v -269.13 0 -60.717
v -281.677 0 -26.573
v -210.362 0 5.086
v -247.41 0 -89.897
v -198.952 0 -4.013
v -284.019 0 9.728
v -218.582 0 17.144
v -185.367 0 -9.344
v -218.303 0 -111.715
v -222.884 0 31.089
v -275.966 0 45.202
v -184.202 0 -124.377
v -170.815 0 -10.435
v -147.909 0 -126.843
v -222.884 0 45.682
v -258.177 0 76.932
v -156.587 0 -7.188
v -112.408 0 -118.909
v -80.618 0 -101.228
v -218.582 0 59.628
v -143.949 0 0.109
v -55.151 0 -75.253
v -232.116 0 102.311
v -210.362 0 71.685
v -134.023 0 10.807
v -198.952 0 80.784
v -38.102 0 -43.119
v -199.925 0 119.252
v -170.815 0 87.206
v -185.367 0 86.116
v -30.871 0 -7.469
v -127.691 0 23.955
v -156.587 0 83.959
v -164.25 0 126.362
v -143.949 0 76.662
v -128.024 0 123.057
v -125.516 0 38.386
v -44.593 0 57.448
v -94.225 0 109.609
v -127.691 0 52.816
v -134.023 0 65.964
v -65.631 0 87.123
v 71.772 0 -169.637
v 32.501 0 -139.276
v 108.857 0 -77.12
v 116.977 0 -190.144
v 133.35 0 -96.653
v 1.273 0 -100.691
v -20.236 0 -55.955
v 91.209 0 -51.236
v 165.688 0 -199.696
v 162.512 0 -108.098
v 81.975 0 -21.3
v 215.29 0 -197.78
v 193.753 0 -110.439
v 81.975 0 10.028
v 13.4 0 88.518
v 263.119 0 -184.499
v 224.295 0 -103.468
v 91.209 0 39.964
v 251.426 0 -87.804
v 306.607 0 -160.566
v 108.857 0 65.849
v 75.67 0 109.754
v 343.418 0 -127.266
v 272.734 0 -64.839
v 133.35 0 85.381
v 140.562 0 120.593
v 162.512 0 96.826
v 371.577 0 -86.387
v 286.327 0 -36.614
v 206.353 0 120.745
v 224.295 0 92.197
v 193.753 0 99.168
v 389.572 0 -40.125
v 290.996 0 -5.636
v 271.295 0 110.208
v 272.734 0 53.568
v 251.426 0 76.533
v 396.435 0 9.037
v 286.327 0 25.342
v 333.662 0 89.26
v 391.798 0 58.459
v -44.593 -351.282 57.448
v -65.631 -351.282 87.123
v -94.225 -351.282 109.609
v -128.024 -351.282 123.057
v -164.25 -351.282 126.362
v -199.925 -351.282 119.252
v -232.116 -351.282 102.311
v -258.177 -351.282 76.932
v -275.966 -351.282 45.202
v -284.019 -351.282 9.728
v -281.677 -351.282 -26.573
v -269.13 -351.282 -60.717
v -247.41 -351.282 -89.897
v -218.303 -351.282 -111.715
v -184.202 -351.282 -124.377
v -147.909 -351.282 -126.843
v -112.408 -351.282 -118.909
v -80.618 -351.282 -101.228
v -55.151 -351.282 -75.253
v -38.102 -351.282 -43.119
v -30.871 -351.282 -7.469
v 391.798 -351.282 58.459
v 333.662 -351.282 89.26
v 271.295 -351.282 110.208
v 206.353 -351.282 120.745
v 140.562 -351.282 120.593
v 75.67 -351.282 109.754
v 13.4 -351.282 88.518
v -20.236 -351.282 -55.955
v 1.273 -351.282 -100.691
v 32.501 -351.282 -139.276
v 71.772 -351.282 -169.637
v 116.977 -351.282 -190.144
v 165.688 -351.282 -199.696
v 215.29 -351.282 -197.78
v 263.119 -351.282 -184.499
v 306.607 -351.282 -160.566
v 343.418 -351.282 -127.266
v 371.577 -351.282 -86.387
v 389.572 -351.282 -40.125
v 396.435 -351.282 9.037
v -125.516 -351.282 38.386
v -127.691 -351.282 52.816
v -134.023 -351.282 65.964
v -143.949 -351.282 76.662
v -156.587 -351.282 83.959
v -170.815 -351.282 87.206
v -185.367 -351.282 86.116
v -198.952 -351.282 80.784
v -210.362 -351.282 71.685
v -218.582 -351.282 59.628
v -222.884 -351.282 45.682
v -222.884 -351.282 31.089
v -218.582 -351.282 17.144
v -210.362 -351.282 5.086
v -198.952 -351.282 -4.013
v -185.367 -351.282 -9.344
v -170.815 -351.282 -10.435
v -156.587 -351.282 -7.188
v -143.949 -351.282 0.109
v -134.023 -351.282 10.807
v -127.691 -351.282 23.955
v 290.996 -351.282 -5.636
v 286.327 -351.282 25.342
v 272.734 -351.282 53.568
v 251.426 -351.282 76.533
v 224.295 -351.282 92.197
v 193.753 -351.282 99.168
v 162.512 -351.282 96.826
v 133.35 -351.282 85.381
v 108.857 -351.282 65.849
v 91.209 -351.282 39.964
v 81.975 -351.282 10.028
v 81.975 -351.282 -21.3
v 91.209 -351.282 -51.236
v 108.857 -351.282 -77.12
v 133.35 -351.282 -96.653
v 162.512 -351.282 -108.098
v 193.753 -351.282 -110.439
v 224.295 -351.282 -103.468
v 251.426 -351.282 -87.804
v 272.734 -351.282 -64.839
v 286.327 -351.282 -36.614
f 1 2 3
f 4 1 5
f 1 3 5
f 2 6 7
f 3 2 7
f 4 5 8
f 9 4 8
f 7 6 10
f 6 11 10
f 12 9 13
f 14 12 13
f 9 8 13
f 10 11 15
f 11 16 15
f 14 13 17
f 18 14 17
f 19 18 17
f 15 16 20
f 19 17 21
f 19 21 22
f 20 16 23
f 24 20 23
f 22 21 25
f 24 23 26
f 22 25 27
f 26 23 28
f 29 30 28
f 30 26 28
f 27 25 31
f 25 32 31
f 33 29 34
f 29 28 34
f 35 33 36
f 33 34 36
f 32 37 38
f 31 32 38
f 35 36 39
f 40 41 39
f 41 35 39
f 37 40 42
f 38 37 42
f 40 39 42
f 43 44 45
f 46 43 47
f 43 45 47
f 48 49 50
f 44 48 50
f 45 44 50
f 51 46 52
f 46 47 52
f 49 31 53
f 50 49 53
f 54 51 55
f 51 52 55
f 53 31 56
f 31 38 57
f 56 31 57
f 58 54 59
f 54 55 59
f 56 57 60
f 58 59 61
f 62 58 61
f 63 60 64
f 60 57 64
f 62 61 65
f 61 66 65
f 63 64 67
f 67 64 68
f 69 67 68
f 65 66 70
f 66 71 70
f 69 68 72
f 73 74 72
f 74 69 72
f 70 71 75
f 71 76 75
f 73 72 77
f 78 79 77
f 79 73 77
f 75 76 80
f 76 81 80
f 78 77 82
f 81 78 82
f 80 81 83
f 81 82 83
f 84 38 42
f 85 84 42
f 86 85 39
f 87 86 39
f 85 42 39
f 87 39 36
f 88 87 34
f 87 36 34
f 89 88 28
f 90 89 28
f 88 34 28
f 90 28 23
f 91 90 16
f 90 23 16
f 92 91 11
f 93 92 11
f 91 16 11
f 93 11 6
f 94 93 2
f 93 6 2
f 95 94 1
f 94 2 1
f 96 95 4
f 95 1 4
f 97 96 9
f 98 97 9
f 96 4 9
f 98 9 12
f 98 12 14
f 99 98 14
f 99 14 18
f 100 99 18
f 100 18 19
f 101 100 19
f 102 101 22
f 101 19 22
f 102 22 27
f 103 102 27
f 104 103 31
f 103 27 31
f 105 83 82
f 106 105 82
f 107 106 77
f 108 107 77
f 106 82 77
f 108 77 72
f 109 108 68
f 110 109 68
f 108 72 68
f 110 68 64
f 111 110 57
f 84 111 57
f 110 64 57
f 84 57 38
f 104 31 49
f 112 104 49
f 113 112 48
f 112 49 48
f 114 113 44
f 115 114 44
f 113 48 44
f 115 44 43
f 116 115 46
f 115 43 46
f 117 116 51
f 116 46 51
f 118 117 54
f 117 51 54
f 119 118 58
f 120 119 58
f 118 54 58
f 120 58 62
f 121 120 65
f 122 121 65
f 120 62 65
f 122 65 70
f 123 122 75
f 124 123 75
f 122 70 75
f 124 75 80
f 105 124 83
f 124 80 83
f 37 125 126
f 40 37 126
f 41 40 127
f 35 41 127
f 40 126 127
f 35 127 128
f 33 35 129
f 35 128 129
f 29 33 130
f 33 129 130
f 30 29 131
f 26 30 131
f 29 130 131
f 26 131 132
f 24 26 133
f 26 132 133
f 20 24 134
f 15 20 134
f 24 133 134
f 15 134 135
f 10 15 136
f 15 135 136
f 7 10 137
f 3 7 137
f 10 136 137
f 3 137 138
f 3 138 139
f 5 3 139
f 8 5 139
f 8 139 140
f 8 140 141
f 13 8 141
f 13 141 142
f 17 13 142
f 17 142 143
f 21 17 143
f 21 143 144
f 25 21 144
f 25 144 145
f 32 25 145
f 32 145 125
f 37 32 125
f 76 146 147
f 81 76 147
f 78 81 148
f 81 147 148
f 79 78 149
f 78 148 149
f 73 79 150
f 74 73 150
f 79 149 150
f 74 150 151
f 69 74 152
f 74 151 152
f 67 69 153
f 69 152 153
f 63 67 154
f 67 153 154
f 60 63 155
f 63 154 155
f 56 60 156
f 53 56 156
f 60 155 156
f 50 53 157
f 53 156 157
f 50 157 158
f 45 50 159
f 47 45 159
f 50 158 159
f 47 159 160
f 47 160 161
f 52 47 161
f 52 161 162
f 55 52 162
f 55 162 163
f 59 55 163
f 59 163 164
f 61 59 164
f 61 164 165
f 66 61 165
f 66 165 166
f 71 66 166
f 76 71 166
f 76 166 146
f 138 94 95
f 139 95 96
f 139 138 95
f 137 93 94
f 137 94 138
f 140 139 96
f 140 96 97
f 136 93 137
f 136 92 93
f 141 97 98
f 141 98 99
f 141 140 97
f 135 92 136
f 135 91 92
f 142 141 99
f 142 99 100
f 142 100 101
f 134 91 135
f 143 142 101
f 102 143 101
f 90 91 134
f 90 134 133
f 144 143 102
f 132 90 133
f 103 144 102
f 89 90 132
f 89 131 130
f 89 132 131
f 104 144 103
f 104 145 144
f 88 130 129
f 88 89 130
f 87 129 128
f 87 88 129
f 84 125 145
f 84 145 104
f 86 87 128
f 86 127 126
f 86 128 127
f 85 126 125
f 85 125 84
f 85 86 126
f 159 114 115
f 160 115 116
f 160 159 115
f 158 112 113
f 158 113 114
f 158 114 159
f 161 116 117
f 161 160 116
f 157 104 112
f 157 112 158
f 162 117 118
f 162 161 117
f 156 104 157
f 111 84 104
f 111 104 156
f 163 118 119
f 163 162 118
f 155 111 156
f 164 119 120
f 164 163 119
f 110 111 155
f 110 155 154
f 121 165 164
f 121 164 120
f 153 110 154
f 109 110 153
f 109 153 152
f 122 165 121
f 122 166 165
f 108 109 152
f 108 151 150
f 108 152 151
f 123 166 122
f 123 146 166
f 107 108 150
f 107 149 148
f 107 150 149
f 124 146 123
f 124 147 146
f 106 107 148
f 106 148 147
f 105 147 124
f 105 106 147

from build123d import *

# Parameters (mm, degrees)
F1_DEPTH = 351.282
F2_R     = 48.95754
F2_R_2   = 105.097299
F3_DEPTH = 1374.14


with BuildPart() as f1:
    # F0 (on Front) → F1 (new body)
    with BuildSketch(Plane.XZ):
        with BuildLine():
            ThreePointArc((391.798198, 58.458883), (173.454343, 122.011763), (-44.592593, 57.447519))
            ThreePointArc((-44.592593, 57.447519), (-281.676548, -26.572557), (-30.87141, -7.468691))
            ThreePointArc((-30.87141, -7.468691), (215.289624, -197.780053), (391.798198, 58.458883))
        make_face()
    extrude(amount=F1_DEPTH)

    # F2 (on face) → F3 (cut)
    with BuildSketch(Plane.XZ.offset(351.282)):
        with Locations((-174.473122, 38.385659)):
            Circle(F2_R)
        with Locations((185.898572, -5.635798)):
            Circle(F2_R_2)
    extrude(amount=-F3_DEPTH, mode=Mode.SUBTRACT)


solid = f1.part
